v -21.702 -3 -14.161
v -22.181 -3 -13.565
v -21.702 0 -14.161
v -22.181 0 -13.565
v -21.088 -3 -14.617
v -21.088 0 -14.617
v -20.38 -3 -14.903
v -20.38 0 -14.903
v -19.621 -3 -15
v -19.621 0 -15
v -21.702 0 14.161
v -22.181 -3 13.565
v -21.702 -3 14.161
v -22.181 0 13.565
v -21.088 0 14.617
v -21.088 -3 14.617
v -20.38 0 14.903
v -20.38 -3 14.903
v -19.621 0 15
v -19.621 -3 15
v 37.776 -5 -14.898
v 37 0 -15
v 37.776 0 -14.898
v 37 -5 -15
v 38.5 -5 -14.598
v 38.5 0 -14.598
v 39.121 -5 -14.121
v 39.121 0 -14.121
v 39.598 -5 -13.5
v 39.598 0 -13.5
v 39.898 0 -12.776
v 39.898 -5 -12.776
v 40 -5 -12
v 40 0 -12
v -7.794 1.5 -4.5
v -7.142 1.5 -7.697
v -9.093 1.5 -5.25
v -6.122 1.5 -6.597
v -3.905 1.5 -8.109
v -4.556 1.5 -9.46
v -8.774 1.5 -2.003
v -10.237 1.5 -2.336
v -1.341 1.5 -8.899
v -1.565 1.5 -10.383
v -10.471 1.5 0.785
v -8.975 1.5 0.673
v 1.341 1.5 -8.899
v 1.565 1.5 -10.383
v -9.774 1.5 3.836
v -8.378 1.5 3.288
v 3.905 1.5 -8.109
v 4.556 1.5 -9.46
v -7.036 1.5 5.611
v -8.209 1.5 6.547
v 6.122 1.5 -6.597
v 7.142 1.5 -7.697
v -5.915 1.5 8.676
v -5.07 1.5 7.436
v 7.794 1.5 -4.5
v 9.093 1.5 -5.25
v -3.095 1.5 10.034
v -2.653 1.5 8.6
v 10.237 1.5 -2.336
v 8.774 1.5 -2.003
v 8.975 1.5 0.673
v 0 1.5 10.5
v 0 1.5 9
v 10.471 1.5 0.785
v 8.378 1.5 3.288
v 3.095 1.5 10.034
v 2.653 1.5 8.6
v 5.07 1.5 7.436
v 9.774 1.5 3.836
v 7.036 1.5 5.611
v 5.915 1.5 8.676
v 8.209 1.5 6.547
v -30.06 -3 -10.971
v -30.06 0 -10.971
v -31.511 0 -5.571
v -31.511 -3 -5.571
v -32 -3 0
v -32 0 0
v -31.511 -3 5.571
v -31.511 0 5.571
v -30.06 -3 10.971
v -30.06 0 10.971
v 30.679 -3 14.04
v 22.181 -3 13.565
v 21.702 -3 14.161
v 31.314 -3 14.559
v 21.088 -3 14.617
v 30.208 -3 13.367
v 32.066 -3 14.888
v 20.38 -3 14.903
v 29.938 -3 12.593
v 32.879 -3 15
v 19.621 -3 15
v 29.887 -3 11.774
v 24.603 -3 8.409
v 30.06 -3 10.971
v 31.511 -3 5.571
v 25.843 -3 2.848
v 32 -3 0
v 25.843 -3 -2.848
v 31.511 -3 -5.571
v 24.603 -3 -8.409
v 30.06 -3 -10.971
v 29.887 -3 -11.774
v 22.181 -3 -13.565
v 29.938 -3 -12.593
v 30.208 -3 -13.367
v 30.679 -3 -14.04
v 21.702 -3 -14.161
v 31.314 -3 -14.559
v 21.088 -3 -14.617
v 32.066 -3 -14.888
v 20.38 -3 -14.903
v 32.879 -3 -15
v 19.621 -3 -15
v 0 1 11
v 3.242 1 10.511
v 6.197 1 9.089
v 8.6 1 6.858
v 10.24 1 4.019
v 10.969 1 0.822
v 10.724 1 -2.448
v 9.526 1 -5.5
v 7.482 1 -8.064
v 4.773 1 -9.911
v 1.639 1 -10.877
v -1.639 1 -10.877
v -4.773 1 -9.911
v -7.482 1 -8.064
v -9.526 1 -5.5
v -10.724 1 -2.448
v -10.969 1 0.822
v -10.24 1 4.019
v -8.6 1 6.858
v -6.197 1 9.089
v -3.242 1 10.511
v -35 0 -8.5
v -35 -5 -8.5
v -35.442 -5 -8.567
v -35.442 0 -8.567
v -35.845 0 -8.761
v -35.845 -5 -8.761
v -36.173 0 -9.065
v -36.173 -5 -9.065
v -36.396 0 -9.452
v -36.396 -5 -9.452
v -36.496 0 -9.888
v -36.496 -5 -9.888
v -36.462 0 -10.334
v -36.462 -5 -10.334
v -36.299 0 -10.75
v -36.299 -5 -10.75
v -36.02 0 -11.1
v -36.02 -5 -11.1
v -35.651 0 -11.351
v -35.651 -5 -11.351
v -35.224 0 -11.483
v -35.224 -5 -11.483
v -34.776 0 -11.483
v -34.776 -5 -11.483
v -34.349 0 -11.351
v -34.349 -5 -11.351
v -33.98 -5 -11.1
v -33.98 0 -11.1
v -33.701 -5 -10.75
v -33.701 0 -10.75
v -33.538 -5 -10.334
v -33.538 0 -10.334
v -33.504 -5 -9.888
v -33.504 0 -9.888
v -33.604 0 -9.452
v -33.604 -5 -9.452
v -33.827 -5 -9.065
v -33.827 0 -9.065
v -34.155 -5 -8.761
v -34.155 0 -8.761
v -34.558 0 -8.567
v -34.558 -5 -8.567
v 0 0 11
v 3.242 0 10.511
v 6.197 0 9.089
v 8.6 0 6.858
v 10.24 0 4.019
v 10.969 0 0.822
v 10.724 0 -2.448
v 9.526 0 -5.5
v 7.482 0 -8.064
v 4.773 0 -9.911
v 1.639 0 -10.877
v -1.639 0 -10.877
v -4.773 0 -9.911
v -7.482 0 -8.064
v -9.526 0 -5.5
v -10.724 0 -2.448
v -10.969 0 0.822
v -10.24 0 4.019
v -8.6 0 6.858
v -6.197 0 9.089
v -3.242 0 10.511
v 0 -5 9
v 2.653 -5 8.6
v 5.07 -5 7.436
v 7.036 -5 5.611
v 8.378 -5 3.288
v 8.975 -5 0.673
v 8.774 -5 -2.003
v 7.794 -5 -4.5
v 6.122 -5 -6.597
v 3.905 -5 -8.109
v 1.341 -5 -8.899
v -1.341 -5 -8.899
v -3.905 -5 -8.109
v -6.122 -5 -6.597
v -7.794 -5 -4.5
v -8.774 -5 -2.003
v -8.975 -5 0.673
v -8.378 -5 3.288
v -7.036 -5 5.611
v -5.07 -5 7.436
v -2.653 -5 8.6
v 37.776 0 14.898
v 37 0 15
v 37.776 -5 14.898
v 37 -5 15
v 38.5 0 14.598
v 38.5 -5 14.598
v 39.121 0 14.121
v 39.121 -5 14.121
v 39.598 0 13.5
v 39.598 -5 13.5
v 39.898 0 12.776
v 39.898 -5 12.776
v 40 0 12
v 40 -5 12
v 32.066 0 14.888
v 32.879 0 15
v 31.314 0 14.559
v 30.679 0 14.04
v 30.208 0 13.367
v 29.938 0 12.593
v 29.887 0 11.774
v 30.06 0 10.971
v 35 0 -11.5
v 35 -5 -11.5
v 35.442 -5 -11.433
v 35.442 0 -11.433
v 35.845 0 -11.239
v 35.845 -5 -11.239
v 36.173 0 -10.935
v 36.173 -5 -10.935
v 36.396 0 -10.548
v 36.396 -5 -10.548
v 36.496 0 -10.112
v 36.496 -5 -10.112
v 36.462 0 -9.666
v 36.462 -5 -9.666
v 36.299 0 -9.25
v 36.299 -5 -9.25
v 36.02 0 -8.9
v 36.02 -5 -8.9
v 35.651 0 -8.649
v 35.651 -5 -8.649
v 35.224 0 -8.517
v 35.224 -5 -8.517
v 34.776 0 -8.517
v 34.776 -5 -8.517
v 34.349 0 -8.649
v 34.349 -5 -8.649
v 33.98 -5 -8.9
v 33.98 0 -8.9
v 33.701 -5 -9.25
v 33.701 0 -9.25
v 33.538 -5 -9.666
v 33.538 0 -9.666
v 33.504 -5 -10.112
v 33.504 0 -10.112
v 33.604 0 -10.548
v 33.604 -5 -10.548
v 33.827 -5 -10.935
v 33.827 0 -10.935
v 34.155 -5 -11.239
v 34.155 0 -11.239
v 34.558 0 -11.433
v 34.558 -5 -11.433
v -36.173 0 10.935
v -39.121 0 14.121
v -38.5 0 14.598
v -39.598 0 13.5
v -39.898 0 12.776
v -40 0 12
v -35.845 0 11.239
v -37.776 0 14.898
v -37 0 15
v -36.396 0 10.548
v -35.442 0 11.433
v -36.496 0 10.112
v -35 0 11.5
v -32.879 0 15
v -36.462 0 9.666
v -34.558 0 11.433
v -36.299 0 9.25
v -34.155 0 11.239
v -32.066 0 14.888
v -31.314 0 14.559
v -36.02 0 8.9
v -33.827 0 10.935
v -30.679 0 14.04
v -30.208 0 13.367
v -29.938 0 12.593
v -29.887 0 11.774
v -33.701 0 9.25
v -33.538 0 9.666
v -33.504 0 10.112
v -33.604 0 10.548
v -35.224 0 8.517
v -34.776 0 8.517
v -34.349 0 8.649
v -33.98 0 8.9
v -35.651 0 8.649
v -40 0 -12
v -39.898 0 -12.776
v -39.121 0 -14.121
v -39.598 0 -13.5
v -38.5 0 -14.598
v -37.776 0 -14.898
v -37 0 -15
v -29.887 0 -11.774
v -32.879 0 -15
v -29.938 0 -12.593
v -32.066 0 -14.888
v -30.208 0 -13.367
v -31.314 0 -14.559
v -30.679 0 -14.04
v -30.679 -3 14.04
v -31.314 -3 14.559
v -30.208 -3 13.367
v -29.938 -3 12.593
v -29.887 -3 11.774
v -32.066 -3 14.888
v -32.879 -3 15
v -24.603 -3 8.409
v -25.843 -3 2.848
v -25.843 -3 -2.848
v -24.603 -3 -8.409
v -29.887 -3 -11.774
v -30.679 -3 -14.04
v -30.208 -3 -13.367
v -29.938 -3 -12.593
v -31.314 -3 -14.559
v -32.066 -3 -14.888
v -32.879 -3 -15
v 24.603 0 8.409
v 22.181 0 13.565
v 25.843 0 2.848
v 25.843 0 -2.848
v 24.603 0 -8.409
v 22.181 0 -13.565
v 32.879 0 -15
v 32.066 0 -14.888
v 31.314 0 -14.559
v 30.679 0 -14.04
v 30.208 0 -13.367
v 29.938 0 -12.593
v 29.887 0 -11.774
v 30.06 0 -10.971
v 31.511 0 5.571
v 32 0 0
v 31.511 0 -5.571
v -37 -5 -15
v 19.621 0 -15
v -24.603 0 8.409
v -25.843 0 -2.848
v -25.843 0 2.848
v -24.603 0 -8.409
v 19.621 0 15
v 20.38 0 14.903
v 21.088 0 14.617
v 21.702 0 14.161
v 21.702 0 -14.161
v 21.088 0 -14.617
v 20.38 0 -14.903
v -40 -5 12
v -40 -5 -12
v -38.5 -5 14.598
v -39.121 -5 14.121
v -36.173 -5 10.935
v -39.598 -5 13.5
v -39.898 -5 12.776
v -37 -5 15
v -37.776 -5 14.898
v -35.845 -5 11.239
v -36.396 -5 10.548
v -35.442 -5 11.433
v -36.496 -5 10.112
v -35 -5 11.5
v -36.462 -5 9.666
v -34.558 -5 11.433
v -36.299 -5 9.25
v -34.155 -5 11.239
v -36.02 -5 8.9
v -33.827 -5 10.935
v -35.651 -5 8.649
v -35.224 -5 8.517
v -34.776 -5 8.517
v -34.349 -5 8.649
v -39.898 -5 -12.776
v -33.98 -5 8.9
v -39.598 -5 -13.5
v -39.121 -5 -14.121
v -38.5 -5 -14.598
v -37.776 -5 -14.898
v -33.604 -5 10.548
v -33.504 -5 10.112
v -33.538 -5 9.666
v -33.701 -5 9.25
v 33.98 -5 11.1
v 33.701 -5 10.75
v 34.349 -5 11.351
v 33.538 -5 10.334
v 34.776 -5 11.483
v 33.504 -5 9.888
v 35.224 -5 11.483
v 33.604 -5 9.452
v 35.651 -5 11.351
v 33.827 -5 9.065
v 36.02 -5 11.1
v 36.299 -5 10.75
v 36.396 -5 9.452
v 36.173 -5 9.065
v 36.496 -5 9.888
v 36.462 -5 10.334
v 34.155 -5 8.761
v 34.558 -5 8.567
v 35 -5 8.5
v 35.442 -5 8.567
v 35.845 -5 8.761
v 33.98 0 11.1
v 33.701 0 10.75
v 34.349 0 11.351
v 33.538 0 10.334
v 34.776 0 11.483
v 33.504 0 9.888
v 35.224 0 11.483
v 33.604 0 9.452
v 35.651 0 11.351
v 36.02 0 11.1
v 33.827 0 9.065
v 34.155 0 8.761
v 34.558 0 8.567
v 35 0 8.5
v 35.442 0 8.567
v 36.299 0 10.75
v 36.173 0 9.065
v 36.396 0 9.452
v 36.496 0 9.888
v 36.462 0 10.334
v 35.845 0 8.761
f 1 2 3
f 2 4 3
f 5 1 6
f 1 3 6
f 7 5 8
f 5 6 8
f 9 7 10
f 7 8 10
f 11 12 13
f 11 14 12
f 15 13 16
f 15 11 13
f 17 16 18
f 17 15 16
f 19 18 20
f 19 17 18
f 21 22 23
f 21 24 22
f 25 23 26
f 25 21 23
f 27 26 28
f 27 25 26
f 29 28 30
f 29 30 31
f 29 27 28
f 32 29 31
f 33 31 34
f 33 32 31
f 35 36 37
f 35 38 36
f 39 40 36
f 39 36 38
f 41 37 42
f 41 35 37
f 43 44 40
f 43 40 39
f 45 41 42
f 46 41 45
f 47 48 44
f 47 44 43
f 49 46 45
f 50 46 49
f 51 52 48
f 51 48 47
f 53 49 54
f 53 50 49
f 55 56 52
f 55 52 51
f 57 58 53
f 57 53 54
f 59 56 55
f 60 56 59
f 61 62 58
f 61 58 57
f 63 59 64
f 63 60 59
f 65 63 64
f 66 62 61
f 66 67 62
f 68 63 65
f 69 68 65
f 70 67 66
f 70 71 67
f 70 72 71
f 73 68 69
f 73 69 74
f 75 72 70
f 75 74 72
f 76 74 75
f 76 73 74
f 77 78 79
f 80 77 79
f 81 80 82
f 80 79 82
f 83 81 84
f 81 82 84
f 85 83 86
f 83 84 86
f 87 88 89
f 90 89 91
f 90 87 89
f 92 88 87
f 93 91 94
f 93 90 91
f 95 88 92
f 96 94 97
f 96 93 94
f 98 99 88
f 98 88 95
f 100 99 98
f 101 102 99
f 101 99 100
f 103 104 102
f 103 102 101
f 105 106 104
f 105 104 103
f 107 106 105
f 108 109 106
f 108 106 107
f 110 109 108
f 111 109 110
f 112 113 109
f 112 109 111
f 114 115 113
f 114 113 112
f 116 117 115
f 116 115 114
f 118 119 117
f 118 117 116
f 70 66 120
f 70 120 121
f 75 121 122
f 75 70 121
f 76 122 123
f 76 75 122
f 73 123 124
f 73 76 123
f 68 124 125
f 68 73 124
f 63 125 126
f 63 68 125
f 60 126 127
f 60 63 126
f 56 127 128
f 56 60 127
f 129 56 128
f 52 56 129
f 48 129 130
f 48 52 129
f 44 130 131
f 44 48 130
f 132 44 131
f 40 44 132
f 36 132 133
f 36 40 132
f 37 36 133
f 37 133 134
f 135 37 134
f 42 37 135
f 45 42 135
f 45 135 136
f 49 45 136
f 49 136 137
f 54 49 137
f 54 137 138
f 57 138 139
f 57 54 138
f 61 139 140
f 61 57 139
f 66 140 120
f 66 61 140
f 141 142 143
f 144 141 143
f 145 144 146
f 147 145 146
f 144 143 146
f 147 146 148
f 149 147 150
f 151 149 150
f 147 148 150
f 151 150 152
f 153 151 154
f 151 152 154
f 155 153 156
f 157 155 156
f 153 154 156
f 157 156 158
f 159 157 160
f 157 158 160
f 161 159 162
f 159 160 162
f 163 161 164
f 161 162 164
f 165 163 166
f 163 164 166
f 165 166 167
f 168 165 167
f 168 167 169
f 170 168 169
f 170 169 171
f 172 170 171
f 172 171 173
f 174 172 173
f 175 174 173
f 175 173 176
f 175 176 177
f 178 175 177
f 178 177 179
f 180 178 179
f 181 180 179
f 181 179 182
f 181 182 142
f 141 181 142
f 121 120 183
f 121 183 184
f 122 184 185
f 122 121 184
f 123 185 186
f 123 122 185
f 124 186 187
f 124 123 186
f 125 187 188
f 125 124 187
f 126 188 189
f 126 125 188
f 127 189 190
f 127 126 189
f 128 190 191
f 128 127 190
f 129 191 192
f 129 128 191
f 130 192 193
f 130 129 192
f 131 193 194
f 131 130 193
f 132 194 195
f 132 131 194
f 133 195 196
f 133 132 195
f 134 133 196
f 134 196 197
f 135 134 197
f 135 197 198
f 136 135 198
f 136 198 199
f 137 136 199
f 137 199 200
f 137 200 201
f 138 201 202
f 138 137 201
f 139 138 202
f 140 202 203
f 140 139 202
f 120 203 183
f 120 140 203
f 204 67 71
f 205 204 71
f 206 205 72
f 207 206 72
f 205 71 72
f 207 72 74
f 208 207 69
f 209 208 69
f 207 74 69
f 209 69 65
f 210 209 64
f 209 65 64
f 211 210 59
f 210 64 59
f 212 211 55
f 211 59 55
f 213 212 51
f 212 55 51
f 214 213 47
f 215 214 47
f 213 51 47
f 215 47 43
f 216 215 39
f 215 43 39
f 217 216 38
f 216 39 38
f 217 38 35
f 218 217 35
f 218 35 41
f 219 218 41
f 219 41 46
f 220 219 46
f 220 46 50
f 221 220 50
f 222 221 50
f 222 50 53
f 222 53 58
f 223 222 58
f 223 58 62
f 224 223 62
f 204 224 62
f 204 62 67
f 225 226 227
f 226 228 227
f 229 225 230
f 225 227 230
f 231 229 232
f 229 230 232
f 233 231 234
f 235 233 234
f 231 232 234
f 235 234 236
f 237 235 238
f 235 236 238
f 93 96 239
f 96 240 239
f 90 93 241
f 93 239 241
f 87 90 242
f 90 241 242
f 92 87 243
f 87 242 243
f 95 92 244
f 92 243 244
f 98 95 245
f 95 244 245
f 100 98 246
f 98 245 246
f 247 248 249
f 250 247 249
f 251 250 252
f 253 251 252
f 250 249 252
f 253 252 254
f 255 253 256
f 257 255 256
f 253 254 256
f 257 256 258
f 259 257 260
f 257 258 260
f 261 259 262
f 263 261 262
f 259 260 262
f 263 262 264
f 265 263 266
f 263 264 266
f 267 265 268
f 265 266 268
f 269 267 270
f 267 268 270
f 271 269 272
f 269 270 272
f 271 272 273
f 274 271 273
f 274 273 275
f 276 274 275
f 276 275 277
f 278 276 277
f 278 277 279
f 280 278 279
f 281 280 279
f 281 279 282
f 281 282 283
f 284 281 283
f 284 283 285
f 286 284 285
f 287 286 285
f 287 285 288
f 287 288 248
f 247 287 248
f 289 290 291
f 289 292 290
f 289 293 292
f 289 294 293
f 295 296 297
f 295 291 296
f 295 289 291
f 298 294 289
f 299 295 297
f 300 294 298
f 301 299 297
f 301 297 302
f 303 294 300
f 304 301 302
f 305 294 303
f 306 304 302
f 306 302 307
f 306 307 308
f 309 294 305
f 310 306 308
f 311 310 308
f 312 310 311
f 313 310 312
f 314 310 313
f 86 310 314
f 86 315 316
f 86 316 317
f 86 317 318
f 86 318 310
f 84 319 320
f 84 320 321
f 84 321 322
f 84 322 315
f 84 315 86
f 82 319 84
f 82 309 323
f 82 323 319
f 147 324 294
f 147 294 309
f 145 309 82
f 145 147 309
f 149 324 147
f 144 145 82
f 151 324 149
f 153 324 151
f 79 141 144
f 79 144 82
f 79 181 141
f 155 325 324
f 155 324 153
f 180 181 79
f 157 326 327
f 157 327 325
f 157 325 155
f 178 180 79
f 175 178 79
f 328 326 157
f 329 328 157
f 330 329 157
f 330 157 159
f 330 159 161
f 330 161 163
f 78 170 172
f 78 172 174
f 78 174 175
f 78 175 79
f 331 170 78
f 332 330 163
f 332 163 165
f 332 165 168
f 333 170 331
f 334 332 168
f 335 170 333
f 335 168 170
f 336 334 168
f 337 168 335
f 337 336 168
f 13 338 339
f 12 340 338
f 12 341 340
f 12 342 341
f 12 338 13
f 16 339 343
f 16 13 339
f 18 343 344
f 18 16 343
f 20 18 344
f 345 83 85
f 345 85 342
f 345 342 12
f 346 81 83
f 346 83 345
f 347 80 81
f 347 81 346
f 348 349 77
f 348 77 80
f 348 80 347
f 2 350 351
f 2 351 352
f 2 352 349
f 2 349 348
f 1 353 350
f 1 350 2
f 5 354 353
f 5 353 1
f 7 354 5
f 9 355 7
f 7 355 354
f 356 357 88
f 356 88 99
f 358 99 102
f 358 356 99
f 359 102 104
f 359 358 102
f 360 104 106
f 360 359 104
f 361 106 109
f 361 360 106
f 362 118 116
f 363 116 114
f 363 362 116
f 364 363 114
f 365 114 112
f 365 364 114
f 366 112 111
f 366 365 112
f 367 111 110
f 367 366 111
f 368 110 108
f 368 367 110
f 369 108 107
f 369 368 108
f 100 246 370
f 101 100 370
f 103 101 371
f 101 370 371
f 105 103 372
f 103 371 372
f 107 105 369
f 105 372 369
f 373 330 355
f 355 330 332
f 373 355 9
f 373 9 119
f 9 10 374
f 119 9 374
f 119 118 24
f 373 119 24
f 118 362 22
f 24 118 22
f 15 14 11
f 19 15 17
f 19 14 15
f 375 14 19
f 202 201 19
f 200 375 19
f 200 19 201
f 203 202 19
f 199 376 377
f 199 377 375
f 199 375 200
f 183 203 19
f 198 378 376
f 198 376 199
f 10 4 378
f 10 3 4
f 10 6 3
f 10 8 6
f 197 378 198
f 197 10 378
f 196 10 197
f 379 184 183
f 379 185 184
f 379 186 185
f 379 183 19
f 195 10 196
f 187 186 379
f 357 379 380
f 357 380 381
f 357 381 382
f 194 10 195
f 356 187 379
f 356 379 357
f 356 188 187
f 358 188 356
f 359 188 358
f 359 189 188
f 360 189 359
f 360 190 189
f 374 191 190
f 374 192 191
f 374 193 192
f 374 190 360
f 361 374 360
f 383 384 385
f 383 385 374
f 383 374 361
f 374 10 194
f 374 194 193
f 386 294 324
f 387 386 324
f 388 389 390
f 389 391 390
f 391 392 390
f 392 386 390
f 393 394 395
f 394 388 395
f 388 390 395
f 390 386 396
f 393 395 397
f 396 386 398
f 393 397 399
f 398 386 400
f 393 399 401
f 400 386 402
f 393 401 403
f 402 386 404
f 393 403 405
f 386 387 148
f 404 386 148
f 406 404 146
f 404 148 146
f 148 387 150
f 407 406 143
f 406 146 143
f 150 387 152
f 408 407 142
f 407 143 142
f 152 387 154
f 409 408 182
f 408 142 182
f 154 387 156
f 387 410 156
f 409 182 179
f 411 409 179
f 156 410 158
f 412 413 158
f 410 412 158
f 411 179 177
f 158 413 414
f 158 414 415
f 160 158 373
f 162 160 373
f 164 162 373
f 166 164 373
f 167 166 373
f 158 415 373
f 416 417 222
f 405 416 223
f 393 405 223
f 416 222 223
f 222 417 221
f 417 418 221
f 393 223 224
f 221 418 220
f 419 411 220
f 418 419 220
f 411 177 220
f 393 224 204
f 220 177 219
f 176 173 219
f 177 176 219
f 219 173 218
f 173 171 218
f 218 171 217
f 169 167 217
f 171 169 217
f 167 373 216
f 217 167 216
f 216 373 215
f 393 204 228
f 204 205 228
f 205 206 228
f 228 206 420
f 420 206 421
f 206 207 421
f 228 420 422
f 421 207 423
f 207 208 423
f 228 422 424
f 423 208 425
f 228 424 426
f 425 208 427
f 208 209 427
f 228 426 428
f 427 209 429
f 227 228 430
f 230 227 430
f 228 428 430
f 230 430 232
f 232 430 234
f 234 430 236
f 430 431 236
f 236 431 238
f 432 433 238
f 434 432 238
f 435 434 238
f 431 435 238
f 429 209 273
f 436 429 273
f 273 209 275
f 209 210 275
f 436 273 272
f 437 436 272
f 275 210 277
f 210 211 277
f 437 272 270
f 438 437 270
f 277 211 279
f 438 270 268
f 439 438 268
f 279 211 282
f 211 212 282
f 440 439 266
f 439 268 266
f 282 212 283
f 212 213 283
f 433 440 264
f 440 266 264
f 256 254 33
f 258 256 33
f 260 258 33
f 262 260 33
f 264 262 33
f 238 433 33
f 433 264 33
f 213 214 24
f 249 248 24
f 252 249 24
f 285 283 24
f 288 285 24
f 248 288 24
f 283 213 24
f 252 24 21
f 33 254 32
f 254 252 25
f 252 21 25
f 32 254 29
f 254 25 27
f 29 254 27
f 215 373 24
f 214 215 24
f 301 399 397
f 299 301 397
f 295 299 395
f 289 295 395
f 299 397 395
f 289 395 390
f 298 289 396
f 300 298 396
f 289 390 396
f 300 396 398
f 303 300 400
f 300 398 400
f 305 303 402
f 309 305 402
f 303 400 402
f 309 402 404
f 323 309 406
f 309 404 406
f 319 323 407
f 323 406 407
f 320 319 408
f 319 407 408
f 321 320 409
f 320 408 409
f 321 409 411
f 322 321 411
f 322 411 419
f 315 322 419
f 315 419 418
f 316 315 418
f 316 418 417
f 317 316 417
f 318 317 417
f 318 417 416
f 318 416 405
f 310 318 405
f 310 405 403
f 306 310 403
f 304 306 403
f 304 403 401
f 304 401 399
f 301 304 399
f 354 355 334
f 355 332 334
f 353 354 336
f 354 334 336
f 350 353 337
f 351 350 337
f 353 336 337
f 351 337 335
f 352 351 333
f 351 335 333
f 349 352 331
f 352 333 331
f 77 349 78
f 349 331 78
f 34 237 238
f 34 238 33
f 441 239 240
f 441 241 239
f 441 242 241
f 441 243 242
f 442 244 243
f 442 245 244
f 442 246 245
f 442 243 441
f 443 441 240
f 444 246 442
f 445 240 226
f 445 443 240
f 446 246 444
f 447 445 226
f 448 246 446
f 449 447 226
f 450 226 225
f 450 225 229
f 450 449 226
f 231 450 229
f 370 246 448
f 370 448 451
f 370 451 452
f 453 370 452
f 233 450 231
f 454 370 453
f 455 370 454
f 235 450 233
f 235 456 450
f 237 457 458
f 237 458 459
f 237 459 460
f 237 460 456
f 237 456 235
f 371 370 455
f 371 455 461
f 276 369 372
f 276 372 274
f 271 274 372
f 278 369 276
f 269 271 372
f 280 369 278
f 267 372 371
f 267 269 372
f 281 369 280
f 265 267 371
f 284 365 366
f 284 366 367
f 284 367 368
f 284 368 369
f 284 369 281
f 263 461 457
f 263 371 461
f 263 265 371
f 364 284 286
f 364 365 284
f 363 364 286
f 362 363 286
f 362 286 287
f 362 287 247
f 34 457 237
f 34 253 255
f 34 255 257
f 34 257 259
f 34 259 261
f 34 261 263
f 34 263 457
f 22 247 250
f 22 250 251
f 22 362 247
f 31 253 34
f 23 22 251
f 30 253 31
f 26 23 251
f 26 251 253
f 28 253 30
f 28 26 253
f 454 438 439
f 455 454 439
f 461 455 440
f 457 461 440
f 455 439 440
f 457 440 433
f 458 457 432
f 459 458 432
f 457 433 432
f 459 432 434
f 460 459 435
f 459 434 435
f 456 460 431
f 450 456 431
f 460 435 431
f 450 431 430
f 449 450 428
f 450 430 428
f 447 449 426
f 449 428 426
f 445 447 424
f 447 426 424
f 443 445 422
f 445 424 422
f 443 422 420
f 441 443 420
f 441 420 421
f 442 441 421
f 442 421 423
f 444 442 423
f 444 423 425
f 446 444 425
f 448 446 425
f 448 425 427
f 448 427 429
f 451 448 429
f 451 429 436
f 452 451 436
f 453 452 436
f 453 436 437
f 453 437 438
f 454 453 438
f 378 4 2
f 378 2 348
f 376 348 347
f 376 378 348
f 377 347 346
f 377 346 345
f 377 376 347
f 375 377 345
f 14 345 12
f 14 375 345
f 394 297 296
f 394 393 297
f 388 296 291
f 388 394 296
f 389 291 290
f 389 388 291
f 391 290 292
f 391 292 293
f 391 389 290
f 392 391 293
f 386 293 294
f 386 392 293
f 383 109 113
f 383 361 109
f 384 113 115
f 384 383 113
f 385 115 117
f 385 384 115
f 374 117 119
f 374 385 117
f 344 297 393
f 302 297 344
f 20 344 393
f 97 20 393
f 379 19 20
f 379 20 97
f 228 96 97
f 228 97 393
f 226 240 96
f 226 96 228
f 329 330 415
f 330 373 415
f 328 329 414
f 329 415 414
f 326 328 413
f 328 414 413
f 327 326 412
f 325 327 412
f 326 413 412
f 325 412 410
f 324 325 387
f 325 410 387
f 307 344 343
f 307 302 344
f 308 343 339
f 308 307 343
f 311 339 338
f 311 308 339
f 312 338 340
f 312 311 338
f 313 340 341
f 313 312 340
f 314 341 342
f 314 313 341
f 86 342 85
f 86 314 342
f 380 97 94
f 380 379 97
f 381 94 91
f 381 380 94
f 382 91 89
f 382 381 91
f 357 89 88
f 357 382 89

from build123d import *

# Parameters (mm, degrees)
SKETCH_1_W          = 80
SKETCH_1_H          = 30
SKETCH_1_R          = 9
EXTRUDE_1_DEPTH     = 5
EXTRUDE_START       = 1.5
SKETCH_4_R          = 11
SKETCH_4_R_2        = 9
EXTRUDE_4_DEPTH     = 1.5
SKETCH_5_R          = 32
SKETCH_5_R_2        = 26
CUT_EXTRUDE_1_DEPTH = 3
SKETCH_8_R          = 1.5
CUT_EXTRUDE_2_DEPTH = 10
FILLET_1_R          = 3
CHAMFER_1_SIZE      = 0.5


with BuildPart() as part:
    # 草图1 → 凸台-拉伸1 (new body)
    with BuildSketch(Plane(origin=(0, 0, 0), x_dir=(1, 0, 0), z_dir=(0, 1, 0))):
        Rectangle(SKETCH_1_W, SKETCH_1_H)
        with Locations(Location((0, 0, 0), (0, 0, 270))):
            Circle(SKETCH_1_R, mode=Mode.SUBTRACT)
    extrude(amount=-EXTRUDE_1_DEPTH)

    # 草图4 → 凸台-拉伸4 (add)
    with BuildSketch(Plane(origin=(0, 0, 0), x_dir=(1, 0, 0), z_dir=(0, 1, 0)).offset(EXTRUDE_START)):
        with Locations(Location((0, 0, 0), (0, 0, 270))):
            Circle(SKETCH_4_R)
        with Locations(Location((0, 0, 0), (0, 0, 270))):
            Circle(SKETCH_4_R_2, mode=Mode.SUBTRACT)
    extrude(amount=-EXTRUDE_4_DEPTH)

    # 草图5 → 切除-拉伸1 (cut)
    with BuildSketch(Plane(origin=(0, 0, 0), x_dir=(1, 0, 0), z_dir=(0, 1, 0))):
        Circle(SKETCH_5_R)
        Circle(SKETCH_5_R_2, mode=Mode.SUBTRACT)
    extrude(amount=-CUT_EXTRUDE_1_DEPTH, mode=Mode.SUBTRACT)

    # 草图8 → 切除-拉伸2 (cut)
    with BuildSketch(Plane.XZ.offset(5)):
        with Locations(Location((35, 10, 0), (0, 0, 270))):
            Circle(SKETCH_8_R)
        with Locations(Location((35, -10, 0), (0, 0, 270))):
            Circle(SKETCH_8_R)
        with Locations(Location((-35, -10, 0), (0, 0, 90))):
            Circle(SKETCH_8_R)
        with Locations(Location((-35, 10, 0), (0, 0, 90))):
            Circle(SKETCH_8_R)
    extrude(amount=-CUT_EXTRUDE_2_DEPTH, mode=Mode.SUBTRACT)

    # 圆角1
    fillet_1_edges = [part.edges().sort_by_distance(p)[0] for p in [
        (28.26658805, -1.5, 15),
        (-28.26658805, -1.5, 15),
        (-28.26658805, -1.5, -15),
        (28.26658805, -1.5, -15),
        (21.236760582, -1.5, 15),
        (21.236760582, -1.5, -15),
        (-21.236760582, -1.5, 15),
        (-21.236760582, -1.5, -15),
        (40, -2.5, 15),
        (-40, -2.5, 15),
        (-40, -2.5, -15),
        (40, -2.5, -15),
    ]]
    fillet(fillet_1_edges, radius=FILLET_1_R)

    # 倒角1
    chamfer_1_edges = [part.edges().sort_by_distance(p)[0] for p in [
        (0, 1.5, -11),
    ]]
    chamfer(chamfer_1_edges, length=CHAMFER_1_SIZE)


solid = part.part
